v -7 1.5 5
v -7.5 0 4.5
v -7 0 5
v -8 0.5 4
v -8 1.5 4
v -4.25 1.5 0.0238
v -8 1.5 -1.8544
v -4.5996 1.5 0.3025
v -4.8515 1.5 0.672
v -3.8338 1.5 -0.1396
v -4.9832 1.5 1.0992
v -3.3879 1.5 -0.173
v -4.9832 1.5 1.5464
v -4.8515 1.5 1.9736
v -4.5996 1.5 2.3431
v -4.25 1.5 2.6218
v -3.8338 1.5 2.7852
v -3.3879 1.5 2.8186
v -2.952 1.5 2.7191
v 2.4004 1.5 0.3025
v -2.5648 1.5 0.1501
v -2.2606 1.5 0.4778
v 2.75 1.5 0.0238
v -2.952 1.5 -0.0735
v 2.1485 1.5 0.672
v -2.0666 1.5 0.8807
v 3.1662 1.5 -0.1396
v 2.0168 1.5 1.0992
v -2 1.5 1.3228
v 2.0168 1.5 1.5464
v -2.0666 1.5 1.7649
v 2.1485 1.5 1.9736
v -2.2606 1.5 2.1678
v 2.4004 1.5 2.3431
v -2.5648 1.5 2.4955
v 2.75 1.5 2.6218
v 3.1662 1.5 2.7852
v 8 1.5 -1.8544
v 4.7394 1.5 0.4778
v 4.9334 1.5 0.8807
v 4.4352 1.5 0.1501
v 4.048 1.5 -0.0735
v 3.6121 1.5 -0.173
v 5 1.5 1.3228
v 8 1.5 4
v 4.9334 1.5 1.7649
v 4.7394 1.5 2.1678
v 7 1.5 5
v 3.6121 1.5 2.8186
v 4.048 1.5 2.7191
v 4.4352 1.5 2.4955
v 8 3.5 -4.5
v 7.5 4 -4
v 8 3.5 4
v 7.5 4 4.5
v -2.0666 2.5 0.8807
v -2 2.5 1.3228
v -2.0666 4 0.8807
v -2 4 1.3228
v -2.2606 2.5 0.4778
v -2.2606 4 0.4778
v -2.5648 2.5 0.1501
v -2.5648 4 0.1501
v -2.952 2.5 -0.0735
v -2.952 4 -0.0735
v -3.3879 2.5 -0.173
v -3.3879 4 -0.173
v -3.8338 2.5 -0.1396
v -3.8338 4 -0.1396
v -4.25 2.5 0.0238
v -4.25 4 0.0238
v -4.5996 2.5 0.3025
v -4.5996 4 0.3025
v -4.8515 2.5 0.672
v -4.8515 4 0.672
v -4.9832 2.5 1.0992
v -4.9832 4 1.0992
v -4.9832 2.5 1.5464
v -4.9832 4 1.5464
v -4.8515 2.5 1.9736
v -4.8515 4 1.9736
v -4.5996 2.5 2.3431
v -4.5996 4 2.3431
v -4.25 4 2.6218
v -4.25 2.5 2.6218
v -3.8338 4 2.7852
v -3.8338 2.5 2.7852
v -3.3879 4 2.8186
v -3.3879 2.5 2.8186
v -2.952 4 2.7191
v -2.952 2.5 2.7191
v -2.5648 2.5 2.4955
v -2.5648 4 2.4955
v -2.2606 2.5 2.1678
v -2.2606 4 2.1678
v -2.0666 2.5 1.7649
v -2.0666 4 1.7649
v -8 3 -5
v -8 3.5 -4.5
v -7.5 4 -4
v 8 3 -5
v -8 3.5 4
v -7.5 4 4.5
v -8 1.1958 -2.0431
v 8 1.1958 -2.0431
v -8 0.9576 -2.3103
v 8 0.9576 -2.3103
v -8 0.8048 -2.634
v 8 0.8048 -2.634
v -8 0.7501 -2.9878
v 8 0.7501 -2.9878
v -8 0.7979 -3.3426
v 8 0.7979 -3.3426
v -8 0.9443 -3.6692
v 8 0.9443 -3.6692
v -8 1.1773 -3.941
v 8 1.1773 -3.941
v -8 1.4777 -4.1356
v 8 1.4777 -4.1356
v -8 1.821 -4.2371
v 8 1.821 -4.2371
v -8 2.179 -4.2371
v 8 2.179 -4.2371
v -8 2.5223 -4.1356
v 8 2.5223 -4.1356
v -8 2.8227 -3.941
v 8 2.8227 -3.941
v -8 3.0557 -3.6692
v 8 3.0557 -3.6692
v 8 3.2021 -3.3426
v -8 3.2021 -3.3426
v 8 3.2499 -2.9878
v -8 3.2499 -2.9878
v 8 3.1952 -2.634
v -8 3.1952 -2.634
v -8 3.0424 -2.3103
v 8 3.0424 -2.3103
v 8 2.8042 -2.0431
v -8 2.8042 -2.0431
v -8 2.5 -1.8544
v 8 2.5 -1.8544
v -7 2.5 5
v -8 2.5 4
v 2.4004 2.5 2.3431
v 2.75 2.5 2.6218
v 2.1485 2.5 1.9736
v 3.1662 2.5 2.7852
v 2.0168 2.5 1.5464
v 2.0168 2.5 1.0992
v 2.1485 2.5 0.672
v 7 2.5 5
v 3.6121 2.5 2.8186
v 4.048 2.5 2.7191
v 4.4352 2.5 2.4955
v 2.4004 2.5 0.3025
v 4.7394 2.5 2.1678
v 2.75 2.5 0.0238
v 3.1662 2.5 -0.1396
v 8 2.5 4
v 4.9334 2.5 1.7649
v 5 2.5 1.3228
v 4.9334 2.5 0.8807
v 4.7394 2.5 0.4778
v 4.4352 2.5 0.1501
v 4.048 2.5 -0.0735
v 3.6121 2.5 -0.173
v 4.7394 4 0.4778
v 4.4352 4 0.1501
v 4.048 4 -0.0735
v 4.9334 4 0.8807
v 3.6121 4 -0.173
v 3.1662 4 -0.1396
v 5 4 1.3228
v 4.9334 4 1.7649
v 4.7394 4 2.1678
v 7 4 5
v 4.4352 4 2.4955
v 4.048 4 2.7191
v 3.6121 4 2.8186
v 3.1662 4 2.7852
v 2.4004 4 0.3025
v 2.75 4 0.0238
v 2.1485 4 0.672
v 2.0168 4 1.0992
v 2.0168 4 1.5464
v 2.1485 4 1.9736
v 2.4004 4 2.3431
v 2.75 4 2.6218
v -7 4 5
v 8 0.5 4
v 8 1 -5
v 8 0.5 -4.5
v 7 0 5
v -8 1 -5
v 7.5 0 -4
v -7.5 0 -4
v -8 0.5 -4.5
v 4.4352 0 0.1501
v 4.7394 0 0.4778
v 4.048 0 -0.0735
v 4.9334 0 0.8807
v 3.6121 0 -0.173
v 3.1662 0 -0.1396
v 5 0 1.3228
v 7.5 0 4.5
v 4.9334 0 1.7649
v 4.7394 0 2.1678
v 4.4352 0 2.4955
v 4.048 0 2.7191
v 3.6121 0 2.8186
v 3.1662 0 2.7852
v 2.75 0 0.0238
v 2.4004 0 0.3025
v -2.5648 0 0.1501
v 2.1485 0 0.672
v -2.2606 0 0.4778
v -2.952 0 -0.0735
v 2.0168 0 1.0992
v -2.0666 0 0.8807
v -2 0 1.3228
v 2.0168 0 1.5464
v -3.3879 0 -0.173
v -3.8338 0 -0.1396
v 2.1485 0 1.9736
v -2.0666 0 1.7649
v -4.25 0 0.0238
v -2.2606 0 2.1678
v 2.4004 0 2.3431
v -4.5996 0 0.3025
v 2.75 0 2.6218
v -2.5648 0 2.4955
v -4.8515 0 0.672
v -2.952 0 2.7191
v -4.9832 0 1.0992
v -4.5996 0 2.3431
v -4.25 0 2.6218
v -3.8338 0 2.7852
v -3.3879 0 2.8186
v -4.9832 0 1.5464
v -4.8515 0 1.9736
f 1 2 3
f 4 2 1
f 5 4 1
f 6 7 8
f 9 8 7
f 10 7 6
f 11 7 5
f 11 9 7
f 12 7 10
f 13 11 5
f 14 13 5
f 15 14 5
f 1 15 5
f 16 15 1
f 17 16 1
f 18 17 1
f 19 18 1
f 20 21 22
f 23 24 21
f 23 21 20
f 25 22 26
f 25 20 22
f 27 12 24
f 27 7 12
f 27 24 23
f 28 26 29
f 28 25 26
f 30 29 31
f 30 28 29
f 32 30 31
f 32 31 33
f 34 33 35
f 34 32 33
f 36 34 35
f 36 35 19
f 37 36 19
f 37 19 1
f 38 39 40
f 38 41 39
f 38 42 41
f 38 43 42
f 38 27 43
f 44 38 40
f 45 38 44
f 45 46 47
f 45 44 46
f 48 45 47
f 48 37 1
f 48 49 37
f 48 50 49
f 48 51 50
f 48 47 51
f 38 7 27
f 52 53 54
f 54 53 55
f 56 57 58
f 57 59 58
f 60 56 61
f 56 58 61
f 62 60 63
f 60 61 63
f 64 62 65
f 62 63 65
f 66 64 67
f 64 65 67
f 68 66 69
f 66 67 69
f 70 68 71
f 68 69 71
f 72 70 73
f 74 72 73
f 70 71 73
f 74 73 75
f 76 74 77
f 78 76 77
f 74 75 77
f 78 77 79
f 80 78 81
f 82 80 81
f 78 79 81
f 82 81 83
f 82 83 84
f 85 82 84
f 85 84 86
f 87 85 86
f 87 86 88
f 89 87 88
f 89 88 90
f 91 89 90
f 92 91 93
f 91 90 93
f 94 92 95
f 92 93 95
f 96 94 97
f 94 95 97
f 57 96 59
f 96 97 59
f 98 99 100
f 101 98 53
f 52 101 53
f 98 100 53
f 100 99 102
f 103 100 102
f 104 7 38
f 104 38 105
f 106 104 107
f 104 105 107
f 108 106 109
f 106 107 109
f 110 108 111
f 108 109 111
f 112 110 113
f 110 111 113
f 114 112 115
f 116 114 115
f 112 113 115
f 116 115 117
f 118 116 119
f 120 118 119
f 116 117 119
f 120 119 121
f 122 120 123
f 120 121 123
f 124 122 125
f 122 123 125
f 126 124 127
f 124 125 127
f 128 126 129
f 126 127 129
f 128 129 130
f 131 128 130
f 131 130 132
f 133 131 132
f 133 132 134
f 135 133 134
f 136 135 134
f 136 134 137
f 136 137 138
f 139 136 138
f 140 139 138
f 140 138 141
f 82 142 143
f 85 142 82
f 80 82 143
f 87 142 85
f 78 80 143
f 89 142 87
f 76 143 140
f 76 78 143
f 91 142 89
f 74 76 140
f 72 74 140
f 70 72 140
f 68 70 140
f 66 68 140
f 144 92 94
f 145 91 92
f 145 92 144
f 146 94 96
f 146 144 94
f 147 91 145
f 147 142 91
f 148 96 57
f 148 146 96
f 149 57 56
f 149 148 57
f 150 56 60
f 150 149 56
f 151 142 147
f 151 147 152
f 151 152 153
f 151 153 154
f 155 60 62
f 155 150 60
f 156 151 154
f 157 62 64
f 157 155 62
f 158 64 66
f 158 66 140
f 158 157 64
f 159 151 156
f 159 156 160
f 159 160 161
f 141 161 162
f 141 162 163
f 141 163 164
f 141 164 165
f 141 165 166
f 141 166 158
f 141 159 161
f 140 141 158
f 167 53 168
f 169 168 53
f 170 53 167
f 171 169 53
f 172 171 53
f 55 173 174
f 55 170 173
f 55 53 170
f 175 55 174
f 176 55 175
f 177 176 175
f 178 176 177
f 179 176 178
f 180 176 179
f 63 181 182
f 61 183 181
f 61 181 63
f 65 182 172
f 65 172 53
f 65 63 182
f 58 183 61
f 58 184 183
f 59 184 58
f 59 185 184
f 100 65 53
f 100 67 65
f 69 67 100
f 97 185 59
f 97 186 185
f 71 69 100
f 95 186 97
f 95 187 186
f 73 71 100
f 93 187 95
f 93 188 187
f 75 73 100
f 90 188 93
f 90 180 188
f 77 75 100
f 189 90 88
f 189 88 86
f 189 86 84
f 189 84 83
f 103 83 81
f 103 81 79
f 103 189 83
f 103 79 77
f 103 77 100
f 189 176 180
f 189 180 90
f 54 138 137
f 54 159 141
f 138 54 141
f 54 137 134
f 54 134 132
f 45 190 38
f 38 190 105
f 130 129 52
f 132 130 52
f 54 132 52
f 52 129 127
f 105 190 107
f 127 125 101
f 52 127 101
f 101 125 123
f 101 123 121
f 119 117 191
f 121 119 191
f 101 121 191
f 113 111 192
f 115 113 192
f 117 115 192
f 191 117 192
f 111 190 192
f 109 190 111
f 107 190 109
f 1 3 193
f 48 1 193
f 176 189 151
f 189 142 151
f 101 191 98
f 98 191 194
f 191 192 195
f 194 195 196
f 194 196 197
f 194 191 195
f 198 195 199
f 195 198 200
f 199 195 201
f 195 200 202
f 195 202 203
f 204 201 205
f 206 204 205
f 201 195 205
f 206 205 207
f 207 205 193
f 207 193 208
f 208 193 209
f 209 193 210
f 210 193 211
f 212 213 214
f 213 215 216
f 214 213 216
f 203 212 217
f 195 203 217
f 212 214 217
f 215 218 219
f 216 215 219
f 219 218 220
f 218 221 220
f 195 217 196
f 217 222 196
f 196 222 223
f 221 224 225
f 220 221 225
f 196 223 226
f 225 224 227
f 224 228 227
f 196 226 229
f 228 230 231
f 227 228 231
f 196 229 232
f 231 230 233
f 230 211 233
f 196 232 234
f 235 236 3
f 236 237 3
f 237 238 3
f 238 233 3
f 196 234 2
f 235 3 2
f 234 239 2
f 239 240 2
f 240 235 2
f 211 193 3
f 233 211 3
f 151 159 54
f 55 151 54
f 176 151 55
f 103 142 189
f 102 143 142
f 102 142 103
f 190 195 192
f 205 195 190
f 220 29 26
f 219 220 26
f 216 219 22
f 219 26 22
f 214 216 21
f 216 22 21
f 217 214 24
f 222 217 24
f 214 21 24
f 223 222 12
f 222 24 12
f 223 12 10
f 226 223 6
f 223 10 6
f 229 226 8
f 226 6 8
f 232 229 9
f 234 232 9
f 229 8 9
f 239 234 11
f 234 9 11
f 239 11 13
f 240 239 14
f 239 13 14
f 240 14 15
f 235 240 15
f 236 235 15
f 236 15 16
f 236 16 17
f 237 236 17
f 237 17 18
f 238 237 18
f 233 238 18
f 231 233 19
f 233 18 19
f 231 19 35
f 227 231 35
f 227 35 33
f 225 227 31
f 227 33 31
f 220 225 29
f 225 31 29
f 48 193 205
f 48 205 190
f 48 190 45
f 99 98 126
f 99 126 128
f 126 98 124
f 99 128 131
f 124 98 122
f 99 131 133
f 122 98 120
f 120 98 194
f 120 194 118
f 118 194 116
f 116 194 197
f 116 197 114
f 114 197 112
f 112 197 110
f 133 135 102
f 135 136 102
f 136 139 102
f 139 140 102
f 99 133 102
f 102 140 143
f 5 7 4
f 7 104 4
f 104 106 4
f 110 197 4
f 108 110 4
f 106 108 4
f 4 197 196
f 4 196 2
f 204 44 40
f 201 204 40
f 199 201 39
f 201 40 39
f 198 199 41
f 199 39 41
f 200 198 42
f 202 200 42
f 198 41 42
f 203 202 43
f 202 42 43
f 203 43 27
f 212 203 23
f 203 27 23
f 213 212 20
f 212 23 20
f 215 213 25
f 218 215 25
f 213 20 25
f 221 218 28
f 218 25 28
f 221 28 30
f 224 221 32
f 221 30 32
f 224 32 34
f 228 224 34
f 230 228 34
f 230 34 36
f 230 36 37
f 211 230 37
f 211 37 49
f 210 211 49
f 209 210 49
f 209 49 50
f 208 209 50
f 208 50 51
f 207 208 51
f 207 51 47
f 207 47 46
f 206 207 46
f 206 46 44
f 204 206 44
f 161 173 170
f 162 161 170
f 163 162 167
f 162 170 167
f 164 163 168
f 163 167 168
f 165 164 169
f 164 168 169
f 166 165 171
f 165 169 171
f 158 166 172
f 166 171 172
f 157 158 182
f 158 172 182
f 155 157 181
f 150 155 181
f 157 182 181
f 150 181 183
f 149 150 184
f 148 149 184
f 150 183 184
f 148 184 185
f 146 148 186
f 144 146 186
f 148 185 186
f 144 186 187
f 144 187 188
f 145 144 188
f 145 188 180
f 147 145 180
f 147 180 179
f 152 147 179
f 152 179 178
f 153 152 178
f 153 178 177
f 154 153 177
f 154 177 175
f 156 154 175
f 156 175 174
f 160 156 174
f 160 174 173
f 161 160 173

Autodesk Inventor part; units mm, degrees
ref_plane "YZ Plane" through (0, 0, 0) normal (1, 0, 0) x (0, 1, 0)
ref_plane "XZ Plane" through (0, 0, 0) normal (0, 1, 0) x (-1, 0, 0)
ref_plane "XY Plane" through (0, 0, 0) normal (0, 0, 1) x (1, 0, 0)
sketch "Esboço1" plane through (0, 0, 0) normal (0, 1, 0) x (-1, 0, 0)
  line L0 (-8, -5) -> (8, -5)
  line L1 (8, -5) -> (8, 5)
  line L2 (8, 5) -> (-8, 5)
  line L3 (-8, 5) -> (-8, -5)
  line L4 (-8, -5) -> (8, 5) construction
  line L5 (8, -5) -> (-8, 5) construction
  point P0 (0, 0)
  dimension "d0" = 16
  dimension "d1" = 10
extrude "Extrusão1" add sketch "Esboço1" along normal blind 4
sketch "Esboço2" plane through (8, 0, 5) normal (1, 0, 0) x (0, 0, -1)
  line L0 (0, 0) -> (0, 4) projected
  line L1 (10, 0) -> (10, 4) projected
  arc A0 (6.8544, 1.5) -> (6.8544, 2.5) centre (8, 2) ccw
  line L2 (-0.795, 1.5) -> (-0.795, 2.5)
  line L3 (-0.795, 2.5) -> (6.8544, 2.5)
  line L4 (6.8544, 1.5) -> (-0.795, 1.5)
  point P0 (5, 0)
  point P1 (0, 2.5)
  point P2 (0, 1.5)
  dimension "d7" = 2.5
  dimension "d8" = 1
extrude "Extrusão2" cut sketch "Esboço2" against normal through all contours L0 L3 A0 L4
chamfer "Chanfro1" distance 1 angle 45 4 edges at (-8, 3.25, 5) (-8, 0.75, 5) (8, 0.75, 5) (8, 3.25, 5)
chamfer "Chanfro2" distance 1 angle 45 2 edges at (0, 4, -5) (0, 0, -5)
chamfer "Chanfro3" distance 0.5 angle 45 4 edges at (8, 4, 0) (8, 0, 0) (-8, 4, 0) (-8, 0, 0)
sketch "Esboço3" plane through (0, 4, 0) normal (0, 1, 0) x (1, 0, 0)
  line L0 (-7.5, -4.5) -> (-7.5, 4) projected
  line L1 (7, -5) -> (8, -4) projected
  line L2 (-7.5, 4) -> (7.5, 4)
  line L3 (7.5, 4) -> (7.5, -4.5)
  line L4 (7.5, -4.5) -> (-7.5, -4.5)
  line L5 (-7.5, -4.5) -> (-7.5, 4)
  line L6 (8, 1.8544) -> (-8, 1.8544) projected
  line L7 (-7.5, 1.8544) -> (7.5, 1.8544)
  line L8 (7.5, 1.8544) -> (7.5, -4.5)
  line L9 (7.5, -4.5) -> (-7.5, -4.5)
  line L10 (-7.5, -4.5) -> (-7.5, 1.8544)
  line L11 (-7.5, -1.3228) -> (7.5, -1.3228)
  line L12 (-7.5, -1.3228) -> (-3.5, -1.3228)
  circle A0 centre (-3.5, -1.3228) radius 1.5
  line L13 (7.5, -1.3228) -> (3.5, -1.3228)
  circle A1 centre (3.5, -1.3228) radius 1.5
  point P0 (0, 0)
  dimension "d20" = 4
  dimension "d21" = 3
  dimension "d22" = 4
  dimension "d23" = 3
extrude "Extrusão3" cut sketch "Esboço3" against normal through all contours A0 L11 | L11 A0 | A1 L11 | L11 A1
properties part number "Sup_haste_corpo"
